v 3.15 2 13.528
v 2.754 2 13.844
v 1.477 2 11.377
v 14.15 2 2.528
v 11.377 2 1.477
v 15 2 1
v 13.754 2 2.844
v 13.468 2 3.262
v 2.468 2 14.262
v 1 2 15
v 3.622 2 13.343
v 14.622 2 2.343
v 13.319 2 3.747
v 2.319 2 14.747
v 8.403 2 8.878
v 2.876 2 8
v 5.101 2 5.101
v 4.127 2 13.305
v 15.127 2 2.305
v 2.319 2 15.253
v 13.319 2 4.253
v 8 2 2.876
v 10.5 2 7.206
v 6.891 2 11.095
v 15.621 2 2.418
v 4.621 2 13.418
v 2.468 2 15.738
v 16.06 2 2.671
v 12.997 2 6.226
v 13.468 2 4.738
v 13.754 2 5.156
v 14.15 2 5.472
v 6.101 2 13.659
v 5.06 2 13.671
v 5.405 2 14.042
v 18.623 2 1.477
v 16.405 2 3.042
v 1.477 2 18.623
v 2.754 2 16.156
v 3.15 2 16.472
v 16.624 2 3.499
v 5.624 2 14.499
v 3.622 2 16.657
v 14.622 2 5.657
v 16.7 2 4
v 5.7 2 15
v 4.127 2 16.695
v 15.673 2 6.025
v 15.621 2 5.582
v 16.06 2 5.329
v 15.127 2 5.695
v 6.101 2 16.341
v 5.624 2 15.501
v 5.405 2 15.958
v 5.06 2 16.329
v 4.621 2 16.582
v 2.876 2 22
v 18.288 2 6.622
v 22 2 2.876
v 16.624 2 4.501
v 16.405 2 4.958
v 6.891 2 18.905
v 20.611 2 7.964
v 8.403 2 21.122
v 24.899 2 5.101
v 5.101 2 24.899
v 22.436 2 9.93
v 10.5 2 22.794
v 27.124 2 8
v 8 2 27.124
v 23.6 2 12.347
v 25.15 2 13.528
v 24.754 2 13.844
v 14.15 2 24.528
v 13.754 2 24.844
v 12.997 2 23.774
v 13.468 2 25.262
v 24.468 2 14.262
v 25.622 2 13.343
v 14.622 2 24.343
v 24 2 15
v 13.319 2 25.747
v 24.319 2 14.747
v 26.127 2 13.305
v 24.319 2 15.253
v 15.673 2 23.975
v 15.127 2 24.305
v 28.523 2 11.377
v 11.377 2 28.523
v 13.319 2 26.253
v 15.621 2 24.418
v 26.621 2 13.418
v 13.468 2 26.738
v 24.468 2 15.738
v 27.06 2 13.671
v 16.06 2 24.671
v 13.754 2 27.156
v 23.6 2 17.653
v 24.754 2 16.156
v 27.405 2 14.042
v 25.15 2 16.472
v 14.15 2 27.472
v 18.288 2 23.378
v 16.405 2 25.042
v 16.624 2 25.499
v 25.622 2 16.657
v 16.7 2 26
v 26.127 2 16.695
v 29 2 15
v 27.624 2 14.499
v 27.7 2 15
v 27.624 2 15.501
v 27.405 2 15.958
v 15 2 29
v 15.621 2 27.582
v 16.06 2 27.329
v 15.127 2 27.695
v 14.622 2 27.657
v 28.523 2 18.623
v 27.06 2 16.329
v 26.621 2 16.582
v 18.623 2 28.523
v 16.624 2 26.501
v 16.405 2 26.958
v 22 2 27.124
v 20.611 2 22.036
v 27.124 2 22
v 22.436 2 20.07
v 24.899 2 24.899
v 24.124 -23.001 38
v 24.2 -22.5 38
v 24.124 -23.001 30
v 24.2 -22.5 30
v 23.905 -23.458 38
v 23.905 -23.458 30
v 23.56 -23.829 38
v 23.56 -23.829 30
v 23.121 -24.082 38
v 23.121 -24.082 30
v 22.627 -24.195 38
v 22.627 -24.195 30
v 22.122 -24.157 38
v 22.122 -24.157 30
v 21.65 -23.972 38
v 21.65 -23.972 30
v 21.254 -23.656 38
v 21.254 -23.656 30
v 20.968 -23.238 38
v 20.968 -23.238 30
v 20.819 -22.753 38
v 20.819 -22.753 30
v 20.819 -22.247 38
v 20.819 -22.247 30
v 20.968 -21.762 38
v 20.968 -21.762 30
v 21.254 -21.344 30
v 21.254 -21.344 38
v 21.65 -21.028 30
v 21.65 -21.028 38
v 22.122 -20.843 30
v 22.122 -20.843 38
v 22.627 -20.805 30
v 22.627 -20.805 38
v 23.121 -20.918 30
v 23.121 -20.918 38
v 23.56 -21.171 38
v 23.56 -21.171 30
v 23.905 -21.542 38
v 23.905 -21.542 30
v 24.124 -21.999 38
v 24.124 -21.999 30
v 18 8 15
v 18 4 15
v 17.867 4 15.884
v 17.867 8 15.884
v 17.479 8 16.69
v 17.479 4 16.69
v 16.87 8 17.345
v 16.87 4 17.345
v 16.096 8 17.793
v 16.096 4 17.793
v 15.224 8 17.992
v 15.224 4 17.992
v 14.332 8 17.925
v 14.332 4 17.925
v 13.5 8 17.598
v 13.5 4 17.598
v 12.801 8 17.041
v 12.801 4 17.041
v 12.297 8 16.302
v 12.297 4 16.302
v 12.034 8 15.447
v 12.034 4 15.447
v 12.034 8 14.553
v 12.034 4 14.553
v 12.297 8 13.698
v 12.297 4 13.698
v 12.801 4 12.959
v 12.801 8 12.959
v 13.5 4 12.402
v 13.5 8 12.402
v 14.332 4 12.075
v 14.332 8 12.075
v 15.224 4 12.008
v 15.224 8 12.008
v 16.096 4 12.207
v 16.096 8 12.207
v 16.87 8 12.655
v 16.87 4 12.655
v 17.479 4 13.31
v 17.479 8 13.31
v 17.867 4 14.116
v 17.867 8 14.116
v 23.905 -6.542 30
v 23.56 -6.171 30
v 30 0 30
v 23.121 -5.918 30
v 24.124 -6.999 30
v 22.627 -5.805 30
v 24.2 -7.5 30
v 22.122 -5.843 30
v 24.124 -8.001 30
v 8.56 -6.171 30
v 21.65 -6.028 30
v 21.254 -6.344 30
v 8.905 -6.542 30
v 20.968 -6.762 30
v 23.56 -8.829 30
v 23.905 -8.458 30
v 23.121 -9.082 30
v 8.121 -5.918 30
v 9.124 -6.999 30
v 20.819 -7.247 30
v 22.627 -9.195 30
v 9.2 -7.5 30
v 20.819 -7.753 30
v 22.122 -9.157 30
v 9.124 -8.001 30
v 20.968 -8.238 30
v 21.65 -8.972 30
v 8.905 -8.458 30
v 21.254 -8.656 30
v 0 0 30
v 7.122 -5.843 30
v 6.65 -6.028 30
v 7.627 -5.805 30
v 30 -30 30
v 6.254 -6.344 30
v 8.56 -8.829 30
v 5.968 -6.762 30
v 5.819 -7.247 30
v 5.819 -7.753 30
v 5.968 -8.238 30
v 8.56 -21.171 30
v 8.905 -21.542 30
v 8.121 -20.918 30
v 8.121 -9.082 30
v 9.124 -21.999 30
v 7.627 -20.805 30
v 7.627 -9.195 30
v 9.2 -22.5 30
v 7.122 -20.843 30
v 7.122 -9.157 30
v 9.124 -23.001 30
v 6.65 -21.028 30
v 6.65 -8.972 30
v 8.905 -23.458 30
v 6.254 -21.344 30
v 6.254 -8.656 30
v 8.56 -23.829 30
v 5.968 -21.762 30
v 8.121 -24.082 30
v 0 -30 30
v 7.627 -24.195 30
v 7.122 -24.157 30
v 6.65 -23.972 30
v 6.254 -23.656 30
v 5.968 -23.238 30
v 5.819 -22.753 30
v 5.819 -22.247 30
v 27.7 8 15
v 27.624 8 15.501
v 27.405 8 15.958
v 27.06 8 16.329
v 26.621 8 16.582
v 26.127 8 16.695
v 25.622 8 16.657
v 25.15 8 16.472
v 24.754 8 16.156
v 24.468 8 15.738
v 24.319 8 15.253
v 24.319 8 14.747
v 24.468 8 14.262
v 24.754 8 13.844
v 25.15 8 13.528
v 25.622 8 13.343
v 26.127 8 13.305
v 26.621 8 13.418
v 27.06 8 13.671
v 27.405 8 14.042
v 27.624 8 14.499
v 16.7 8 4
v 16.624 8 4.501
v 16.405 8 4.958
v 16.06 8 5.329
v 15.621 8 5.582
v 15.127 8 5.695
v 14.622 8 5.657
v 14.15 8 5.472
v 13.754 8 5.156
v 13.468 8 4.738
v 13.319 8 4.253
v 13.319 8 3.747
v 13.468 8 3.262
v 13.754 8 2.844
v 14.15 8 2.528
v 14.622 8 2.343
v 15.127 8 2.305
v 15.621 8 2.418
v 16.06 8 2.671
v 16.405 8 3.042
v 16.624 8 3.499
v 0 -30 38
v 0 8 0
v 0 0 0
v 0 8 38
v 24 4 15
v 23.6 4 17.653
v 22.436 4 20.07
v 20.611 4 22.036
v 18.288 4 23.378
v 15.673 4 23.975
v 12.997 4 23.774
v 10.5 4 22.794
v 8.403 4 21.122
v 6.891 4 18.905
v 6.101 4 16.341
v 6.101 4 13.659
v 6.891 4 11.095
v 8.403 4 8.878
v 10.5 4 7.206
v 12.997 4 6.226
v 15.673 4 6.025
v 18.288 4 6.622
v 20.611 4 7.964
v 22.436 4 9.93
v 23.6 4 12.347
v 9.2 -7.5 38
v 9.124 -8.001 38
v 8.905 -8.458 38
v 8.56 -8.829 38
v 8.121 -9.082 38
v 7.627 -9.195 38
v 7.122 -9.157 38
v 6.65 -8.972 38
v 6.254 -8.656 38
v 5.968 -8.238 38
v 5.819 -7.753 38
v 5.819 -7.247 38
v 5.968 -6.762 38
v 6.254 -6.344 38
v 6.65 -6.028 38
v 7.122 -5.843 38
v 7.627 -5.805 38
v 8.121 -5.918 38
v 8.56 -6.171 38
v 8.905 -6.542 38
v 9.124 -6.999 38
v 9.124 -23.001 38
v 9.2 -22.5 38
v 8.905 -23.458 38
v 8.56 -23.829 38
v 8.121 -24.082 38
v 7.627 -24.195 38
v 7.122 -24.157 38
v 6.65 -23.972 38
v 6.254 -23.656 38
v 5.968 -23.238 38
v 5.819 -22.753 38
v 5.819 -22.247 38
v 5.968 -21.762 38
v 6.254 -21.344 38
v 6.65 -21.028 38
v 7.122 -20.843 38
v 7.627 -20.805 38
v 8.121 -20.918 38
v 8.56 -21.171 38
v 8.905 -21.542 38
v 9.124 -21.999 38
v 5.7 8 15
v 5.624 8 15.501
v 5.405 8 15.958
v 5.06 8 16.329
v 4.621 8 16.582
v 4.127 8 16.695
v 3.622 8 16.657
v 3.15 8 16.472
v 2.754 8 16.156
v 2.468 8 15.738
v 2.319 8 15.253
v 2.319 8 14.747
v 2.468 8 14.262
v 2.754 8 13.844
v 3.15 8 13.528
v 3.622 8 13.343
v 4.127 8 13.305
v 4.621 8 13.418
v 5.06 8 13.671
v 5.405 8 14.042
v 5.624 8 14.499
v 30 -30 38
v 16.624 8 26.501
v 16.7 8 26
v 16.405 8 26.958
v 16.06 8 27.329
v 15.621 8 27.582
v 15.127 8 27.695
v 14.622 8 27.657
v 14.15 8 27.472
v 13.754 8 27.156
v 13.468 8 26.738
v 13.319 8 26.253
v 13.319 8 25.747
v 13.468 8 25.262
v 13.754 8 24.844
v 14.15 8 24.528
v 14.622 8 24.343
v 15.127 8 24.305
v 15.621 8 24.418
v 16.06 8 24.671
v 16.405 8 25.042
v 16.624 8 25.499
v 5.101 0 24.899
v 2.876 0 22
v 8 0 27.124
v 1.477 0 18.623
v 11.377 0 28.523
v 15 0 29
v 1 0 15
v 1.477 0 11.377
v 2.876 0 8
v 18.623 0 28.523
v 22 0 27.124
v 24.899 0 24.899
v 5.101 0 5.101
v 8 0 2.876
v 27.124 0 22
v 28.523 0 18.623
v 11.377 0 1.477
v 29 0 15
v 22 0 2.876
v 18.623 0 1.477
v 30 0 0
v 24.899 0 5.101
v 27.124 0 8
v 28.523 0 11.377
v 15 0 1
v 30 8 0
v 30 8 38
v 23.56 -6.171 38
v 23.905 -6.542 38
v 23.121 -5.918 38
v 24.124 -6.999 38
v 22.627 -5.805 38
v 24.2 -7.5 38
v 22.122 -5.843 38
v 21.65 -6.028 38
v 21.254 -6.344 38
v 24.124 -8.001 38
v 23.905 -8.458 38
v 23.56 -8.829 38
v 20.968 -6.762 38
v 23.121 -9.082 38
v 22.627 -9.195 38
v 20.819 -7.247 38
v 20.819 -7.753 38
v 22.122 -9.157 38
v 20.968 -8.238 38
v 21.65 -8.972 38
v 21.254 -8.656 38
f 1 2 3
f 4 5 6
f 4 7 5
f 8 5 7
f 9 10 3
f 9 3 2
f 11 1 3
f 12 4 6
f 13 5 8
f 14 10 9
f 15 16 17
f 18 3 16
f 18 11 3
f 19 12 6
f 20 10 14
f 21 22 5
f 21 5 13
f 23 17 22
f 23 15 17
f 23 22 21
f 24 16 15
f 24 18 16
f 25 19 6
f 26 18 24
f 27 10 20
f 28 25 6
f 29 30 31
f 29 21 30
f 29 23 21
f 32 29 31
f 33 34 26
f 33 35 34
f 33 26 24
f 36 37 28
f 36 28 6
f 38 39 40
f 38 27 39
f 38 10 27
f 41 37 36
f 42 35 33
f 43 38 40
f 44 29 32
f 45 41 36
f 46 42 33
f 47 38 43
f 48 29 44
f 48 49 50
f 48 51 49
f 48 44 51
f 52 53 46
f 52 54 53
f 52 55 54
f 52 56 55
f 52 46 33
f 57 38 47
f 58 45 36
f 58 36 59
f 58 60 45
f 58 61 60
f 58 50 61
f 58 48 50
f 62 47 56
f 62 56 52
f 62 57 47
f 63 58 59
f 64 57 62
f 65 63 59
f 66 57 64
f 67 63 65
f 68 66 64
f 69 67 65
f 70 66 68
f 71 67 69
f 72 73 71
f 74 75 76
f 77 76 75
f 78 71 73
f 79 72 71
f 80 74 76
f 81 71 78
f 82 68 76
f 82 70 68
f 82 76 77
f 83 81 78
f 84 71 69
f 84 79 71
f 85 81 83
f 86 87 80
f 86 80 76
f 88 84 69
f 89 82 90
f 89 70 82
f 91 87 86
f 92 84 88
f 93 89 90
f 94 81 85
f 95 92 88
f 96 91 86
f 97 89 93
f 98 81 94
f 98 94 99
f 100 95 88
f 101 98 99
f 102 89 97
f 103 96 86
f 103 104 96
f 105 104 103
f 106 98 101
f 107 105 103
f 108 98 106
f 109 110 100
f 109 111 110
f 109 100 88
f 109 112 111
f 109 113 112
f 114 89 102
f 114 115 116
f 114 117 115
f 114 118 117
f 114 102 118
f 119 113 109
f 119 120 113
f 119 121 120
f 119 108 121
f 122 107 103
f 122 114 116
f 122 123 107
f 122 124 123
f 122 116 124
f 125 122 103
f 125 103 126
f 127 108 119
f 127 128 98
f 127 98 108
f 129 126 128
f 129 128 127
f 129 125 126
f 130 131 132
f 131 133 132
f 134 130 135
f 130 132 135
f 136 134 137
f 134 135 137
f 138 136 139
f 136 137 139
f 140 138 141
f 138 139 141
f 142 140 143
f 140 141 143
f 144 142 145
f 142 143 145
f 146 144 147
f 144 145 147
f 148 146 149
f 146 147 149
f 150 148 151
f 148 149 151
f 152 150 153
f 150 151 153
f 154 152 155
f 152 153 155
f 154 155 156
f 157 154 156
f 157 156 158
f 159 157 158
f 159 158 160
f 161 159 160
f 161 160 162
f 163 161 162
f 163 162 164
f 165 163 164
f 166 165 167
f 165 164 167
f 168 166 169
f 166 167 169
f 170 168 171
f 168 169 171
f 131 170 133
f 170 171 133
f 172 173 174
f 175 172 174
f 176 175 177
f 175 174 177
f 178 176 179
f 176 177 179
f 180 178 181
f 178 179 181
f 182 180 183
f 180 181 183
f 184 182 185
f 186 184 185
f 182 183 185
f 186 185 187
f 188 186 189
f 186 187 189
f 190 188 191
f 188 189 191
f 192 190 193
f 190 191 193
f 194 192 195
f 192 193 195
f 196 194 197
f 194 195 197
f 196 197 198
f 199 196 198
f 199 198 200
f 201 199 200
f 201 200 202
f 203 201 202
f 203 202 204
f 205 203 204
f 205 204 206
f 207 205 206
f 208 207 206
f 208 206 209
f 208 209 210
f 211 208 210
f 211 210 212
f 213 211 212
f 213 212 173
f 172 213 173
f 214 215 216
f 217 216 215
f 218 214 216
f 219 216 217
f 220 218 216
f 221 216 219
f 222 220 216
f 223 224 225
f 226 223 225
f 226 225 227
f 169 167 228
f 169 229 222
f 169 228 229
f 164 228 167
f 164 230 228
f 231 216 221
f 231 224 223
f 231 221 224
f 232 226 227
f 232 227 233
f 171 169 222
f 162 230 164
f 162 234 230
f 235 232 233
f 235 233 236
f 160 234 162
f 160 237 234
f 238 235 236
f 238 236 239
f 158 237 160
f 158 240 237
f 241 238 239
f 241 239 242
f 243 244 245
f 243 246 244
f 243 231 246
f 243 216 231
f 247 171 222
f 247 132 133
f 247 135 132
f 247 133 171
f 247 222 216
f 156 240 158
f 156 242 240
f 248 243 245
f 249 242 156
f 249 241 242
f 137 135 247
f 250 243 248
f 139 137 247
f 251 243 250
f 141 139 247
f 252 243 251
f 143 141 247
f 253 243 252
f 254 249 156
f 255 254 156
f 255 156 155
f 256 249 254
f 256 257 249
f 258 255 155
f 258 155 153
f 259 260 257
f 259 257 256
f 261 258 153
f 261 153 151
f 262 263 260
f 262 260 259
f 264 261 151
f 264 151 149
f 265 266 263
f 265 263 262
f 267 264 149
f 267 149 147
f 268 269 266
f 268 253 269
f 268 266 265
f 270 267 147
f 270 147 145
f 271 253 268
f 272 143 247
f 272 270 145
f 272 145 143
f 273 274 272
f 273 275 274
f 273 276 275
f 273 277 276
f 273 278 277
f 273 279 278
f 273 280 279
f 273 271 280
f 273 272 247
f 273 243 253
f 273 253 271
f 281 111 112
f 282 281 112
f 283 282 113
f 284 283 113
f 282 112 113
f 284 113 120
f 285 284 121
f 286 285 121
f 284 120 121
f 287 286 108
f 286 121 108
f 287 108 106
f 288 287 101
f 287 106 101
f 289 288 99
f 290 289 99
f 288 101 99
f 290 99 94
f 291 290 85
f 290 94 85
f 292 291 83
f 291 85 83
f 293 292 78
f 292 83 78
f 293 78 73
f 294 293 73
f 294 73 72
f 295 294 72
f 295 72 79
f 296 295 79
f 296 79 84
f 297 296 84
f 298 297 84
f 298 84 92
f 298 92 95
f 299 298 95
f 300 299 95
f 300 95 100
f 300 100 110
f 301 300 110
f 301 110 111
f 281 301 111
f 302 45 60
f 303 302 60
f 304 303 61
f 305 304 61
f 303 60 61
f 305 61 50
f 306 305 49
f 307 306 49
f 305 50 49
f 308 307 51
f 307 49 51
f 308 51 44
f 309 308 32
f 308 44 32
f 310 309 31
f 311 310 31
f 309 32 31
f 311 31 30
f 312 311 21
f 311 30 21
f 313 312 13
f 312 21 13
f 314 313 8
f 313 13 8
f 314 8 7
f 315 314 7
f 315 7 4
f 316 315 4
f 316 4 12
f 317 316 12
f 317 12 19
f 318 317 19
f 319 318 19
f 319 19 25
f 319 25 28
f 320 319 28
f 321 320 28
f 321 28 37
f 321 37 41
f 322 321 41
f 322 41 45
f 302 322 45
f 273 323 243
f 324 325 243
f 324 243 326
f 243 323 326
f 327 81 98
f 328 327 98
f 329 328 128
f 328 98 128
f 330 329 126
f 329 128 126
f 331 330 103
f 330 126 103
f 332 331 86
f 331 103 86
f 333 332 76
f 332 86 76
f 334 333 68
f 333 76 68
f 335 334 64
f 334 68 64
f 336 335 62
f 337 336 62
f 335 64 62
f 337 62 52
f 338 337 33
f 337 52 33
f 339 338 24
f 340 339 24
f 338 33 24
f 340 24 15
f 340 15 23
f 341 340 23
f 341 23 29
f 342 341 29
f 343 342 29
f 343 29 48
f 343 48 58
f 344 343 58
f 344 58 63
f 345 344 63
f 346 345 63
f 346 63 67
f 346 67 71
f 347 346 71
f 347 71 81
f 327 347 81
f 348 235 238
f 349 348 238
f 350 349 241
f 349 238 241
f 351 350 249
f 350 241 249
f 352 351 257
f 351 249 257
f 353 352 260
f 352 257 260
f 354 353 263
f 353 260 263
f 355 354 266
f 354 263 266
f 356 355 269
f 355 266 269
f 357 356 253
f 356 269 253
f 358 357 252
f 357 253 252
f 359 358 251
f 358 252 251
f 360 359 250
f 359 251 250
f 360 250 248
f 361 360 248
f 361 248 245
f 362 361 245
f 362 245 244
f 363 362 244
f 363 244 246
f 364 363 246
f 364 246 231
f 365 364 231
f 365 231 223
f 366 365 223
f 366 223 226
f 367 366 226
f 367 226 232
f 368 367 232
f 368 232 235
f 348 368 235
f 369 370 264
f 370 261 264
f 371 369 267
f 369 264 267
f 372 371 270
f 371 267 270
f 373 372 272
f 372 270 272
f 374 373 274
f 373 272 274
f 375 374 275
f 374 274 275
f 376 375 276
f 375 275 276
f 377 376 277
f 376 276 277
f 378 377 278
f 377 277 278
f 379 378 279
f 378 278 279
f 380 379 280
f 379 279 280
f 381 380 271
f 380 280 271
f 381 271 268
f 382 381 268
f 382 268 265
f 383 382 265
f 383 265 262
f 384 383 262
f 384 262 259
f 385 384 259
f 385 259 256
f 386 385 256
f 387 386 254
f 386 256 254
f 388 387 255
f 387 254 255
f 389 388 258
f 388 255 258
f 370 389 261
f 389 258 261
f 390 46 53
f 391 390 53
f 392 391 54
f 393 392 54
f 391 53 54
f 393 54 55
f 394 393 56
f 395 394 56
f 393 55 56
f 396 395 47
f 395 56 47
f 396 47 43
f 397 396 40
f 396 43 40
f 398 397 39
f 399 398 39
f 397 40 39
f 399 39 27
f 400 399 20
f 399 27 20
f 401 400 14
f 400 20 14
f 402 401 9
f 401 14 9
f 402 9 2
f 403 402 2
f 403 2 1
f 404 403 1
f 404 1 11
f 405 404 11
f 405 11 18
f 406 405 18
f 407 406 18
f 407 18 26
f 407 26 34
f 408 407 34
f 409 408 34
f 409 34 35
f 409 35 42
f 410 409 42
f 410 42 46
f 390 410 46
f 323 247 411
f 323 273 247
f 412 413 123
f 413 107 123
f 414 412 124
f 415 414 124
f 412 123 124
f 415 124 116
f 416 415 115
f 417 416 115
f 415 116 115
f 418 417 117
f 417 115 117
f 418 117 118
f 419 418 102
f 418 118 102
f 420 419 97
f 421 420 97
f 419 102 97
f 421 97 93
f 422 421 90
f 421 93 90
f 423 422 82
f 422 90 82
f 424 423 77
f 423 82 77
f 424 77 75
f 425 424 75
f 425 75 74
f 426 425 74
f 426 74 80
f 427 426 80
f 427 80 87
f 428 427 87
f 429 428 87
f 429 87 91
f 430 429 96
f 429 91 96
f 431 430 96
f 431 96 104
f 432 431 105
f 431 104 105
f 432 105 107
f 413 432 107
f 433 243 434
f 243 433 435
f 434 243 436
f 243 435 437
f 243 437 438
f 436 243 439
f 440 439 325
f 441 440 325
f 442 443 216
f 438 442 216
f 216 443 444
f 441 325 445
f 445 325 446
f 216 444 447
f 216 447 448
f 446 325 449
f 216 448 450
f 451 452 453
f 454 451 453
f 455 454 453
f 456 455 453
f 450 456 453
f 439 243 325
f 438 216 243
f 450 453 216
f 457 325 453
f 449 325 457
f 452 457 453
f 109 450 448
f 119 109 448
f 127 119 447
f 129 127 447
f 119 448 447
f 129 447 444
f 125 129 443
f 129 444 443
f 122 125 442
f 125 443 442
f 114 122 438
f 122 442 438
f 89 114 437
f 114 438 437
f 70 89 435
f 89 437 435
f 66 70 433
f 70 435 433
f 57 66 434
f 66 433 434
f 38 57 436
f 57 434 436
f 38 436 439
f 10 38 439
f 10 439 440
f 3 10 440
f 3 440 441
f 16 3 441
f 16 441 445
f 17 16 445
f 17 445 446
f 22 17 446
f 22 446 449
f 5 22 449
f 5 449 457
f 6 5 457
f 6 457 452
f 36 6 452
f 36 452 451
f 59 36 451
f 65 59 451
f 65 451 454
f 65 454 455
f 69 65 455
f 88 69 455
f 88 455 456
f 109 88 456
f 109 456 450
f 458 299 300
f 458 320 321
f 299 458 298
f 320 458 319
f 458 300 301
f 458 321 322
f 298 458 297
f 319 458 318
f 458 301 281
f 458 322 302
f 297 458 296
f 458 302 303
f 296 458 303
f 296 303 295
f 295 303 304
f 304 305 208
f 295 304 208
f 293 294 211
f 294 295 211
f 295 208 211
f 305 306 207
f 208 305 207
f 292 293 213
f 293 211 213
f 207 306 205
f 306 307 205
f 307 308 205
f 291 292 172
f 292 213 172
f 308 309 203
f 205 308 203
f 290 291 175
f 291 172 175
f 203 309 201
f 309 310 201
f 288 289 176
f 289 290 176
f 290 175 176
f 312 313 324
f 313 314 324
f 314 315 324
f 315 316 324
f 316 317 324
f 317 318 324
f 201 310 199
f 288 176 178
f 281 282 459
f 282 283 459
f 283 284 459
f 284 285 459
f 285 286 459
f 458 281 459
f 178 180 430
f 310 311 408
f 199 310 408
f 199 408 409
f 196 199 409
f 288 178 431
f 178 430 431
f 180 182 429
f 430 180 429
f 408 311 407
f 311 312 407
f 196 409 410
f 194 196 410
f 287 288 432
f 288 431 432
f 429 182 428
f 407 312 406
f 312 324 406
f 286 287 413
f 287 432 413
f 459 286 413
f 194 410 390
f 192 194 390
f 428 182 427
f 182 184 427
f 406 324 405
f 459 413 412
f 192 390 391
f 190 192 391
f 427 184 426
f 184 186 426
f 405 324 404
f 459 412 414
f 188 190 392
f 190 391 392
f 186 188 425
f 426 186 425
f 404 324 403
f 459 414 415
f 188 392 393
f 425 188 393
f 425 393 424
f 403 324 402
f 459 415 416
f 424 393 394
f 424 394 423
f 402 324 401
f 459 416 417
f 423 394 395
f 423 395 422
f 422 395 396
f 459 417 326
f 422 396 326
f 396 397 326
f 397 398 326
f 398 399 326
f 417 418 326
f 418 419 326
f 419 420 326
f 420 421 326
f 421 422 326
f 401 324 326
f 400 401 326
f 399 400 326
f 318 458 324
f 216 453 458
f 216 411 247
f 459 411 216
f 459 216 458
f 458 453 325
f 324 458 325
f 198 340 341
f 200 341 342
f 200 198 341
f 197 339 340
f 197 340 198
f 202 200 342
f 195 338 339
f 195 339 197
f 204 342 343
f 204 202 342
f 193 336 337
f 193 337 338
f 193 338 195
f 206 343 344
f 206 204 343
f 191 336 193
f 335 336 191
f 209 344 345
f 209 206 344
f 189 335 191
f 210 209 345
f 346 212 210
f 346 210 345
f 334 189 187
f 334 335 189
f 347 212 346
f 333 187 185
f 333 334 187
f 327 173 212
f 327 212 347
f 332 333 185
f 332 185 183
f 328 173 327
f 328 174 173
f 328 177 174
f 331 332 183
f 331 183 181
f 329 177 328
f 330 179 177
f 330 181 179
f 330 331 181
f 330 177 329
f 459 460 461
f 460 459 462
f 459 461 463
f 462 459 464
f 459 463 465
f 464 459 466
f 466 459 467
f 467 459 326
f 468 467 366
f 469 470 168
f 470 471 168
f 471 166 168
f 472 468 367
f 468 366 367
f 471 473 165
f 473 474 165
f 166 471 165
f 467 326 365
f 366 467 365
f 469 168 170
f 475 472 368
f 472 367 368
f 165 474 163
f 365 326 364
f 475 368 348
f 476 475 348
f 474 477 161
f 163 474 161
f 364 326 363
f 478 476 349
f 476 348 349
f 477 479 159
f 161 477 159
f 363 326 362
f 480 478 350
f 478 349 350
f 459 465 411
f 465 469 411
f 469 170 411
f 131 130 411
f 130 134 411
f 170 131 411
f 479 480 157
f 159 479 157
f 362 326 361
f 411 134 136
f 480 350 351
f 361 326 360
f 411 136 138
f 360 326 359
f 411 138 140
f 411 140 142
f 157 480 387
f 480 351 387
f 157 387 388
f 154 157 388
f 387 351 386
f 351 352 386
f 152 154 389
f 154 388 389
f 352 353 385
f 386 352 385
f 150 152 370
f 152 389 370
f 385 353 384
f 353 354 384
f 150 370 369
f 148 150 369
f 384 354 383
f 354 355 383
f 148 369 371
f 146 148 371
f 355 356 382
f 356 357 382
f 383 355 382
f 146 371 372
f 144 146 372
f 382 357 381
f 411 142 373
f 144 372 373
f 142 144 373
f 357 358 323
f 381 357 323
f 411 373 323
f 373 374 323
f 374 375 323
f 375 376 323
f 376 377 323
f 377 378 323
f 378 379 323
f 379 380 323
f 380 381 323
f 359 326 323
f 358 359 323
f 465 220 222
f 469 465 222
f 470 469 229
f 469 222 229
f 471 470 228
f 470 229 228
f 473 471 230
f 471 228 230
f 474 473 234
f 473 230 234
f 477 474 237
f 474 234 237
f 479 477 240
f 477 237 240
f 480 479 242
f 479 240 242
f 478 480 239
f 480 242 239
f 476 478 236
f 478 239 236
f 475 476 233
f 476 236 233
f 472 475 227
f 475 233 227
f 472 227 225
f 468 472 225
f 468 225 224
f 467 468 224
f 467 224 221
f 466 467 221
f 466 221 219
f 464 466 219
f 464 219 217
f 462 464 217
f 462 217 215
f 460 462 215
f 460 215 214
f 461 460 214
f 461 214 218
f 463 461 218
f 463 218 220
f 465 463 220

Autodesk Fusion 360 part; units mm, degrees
sketch "Sketch1" plane through (0, 0, 0) normal (0, 1, 0) x (1, 0, 0)
  line L0 (0, 0) -> (0, -30)
  line L1 (0, -30) -> (30, -30)
  line L2 (30, -30) -> (30, 0)
  line L3 (30, 0) -> (0, 0)
  dimension "d1" = 30
  dimension "d2" = 30
extrude "Extrude1" add sketch "Sketch1" along normal blind 8
sketch "Sketch2" plane through (0, 0, 0) normal (0, -1, 0) x (1, 0, 0)
  line L0 (0, 0) -> (30, 0)
  line L1 (30, 0) -> (30, 30)
  line L2 (30, 30) -> (0, 30)
  line L3 (0, 30) -> (0, 0)
  circle A0 centre (15, 15) radius 14
  dimension "d5" = 28
extrude "Extrude2" cut sketch "Sketch2" along normal blind 2 and the other way blind 2 contours A0
sketch "Sketch4" plane through (0, 2, 0) normal (0, -1, 0) x (1, 0, 0)
  circle A0 centre (15, 15) radius 3
  dimension "d10" = 6
extrude "Extrude3" cut sketch "Sketch4" against normal blind 6
sketch "Sketch7" plane through (0, 0, 0) normal (1, 0, 0) x (0, 1, 0)
  line L0 (8, 30) -> (8, 38)
  line L1 (8, 38) -> (-30, 38)
  line L2 (8, 30) -> (-30, 30)
  line L3 (-30, 30) -> (-30, 38)
  dimension "d40" = 8
  dimension "d41" = 38
sketch "Sketch8" plane through (0, 2, 0) normal (0, -1, 0) x (1, 0, 0)
  circle A0 centre (15, 15) radius 3
  circle A1 centre (15, 15) radius 14
sketch "Sketch10" plane through (0, 2, 0) normal (0, -1, 0) x (1, 0, 0)
  circle A0 centre (15, 4) radius 1.7
  circle A1 centre (15, 26) radius 1.7
  circle A2 centre (4, 15) radius 1.7
  circle A3 centre (26, 15) radius 1.7
  dimension "d31" = 3.4
  dimension "d32" = 3.4
  dimension "d33" = 3.4
  dimension "d34" = 3.4
extrude "Extrude5" cut sketch "Sketch10" against normal blind 6
sketch "Sketch11" plane through (0, 2, 0) normal (0, -1, 0) x (1, 0, 0)
  circle A0 centre (15, 15) radius 9
  dimension "d37" = 18
extrude "Extrude6" cut sketch "Sketch11" against normal blind 2
extrude "Extrude7" add sketch "Sketch7" along normal blind 30
sketch "Sketch14" plane through (0, 0, 30) normal (0, 0, -1) x (1, 0, 0)
  line L0 (0, 0) -> (30, 0)
  line L1 (30, 0) -> (30, 30)
  line L2 (30, 30) -> (0, 30)
  line L3 (0, 30) -> (0, 0)
  circle A0 centre (7.5, 7.5) radius 1.7
  circle A1 centre (22.5, 7.5) radius 1.7
  circle A2 centre (7.5, 22.5) radius 1.7
  circle A3 centre (22.5, 22.5) radius 1.7
  dimension "d46" = 3.4
  dimension "d47" = 3.4
  dimension "d48" = 3.4
  dimension "d49" = 3.4
extrude "Extrude8" cut sketch "Sketch14" against normal blind 8 contours A0 | A1 | A2 | A3
equation "d1 = feature1Height"
equation "d2 = mountWidth"
equation "d5 = motorDC"
equation "d10 = shaftDiameter"
equation "d31 = boltClearance"
equation "d32 = boltClearance"
equation "d33 = boltClearance"
equation "d34 = boltClearance"
equation "d40 = plateThickness"
equation "d41 = feature2Length"
equation "d46 = boltClearance"
equation "d47 = boltClearance"
equation "d48 = boltClearance"
equation "d49 = boltClearance"
equation "mountWidth = 30 mm"
equation "feature1Height = 30 mm"
equation "feature2Length = 38 mm"
equation "plateThickness = 8 mm"
equation "motorBCD = 22 mm"
equation "boltClearance = 3.4 mm"
equation "shaftDiameter = 6 mm"
equation "pilotDiameter = 18 mm"
equation "pilotDepth = 2 mm"
equation "wallHoleOffset = 7.5 mm"
equation "motorDC = 28 mm"
